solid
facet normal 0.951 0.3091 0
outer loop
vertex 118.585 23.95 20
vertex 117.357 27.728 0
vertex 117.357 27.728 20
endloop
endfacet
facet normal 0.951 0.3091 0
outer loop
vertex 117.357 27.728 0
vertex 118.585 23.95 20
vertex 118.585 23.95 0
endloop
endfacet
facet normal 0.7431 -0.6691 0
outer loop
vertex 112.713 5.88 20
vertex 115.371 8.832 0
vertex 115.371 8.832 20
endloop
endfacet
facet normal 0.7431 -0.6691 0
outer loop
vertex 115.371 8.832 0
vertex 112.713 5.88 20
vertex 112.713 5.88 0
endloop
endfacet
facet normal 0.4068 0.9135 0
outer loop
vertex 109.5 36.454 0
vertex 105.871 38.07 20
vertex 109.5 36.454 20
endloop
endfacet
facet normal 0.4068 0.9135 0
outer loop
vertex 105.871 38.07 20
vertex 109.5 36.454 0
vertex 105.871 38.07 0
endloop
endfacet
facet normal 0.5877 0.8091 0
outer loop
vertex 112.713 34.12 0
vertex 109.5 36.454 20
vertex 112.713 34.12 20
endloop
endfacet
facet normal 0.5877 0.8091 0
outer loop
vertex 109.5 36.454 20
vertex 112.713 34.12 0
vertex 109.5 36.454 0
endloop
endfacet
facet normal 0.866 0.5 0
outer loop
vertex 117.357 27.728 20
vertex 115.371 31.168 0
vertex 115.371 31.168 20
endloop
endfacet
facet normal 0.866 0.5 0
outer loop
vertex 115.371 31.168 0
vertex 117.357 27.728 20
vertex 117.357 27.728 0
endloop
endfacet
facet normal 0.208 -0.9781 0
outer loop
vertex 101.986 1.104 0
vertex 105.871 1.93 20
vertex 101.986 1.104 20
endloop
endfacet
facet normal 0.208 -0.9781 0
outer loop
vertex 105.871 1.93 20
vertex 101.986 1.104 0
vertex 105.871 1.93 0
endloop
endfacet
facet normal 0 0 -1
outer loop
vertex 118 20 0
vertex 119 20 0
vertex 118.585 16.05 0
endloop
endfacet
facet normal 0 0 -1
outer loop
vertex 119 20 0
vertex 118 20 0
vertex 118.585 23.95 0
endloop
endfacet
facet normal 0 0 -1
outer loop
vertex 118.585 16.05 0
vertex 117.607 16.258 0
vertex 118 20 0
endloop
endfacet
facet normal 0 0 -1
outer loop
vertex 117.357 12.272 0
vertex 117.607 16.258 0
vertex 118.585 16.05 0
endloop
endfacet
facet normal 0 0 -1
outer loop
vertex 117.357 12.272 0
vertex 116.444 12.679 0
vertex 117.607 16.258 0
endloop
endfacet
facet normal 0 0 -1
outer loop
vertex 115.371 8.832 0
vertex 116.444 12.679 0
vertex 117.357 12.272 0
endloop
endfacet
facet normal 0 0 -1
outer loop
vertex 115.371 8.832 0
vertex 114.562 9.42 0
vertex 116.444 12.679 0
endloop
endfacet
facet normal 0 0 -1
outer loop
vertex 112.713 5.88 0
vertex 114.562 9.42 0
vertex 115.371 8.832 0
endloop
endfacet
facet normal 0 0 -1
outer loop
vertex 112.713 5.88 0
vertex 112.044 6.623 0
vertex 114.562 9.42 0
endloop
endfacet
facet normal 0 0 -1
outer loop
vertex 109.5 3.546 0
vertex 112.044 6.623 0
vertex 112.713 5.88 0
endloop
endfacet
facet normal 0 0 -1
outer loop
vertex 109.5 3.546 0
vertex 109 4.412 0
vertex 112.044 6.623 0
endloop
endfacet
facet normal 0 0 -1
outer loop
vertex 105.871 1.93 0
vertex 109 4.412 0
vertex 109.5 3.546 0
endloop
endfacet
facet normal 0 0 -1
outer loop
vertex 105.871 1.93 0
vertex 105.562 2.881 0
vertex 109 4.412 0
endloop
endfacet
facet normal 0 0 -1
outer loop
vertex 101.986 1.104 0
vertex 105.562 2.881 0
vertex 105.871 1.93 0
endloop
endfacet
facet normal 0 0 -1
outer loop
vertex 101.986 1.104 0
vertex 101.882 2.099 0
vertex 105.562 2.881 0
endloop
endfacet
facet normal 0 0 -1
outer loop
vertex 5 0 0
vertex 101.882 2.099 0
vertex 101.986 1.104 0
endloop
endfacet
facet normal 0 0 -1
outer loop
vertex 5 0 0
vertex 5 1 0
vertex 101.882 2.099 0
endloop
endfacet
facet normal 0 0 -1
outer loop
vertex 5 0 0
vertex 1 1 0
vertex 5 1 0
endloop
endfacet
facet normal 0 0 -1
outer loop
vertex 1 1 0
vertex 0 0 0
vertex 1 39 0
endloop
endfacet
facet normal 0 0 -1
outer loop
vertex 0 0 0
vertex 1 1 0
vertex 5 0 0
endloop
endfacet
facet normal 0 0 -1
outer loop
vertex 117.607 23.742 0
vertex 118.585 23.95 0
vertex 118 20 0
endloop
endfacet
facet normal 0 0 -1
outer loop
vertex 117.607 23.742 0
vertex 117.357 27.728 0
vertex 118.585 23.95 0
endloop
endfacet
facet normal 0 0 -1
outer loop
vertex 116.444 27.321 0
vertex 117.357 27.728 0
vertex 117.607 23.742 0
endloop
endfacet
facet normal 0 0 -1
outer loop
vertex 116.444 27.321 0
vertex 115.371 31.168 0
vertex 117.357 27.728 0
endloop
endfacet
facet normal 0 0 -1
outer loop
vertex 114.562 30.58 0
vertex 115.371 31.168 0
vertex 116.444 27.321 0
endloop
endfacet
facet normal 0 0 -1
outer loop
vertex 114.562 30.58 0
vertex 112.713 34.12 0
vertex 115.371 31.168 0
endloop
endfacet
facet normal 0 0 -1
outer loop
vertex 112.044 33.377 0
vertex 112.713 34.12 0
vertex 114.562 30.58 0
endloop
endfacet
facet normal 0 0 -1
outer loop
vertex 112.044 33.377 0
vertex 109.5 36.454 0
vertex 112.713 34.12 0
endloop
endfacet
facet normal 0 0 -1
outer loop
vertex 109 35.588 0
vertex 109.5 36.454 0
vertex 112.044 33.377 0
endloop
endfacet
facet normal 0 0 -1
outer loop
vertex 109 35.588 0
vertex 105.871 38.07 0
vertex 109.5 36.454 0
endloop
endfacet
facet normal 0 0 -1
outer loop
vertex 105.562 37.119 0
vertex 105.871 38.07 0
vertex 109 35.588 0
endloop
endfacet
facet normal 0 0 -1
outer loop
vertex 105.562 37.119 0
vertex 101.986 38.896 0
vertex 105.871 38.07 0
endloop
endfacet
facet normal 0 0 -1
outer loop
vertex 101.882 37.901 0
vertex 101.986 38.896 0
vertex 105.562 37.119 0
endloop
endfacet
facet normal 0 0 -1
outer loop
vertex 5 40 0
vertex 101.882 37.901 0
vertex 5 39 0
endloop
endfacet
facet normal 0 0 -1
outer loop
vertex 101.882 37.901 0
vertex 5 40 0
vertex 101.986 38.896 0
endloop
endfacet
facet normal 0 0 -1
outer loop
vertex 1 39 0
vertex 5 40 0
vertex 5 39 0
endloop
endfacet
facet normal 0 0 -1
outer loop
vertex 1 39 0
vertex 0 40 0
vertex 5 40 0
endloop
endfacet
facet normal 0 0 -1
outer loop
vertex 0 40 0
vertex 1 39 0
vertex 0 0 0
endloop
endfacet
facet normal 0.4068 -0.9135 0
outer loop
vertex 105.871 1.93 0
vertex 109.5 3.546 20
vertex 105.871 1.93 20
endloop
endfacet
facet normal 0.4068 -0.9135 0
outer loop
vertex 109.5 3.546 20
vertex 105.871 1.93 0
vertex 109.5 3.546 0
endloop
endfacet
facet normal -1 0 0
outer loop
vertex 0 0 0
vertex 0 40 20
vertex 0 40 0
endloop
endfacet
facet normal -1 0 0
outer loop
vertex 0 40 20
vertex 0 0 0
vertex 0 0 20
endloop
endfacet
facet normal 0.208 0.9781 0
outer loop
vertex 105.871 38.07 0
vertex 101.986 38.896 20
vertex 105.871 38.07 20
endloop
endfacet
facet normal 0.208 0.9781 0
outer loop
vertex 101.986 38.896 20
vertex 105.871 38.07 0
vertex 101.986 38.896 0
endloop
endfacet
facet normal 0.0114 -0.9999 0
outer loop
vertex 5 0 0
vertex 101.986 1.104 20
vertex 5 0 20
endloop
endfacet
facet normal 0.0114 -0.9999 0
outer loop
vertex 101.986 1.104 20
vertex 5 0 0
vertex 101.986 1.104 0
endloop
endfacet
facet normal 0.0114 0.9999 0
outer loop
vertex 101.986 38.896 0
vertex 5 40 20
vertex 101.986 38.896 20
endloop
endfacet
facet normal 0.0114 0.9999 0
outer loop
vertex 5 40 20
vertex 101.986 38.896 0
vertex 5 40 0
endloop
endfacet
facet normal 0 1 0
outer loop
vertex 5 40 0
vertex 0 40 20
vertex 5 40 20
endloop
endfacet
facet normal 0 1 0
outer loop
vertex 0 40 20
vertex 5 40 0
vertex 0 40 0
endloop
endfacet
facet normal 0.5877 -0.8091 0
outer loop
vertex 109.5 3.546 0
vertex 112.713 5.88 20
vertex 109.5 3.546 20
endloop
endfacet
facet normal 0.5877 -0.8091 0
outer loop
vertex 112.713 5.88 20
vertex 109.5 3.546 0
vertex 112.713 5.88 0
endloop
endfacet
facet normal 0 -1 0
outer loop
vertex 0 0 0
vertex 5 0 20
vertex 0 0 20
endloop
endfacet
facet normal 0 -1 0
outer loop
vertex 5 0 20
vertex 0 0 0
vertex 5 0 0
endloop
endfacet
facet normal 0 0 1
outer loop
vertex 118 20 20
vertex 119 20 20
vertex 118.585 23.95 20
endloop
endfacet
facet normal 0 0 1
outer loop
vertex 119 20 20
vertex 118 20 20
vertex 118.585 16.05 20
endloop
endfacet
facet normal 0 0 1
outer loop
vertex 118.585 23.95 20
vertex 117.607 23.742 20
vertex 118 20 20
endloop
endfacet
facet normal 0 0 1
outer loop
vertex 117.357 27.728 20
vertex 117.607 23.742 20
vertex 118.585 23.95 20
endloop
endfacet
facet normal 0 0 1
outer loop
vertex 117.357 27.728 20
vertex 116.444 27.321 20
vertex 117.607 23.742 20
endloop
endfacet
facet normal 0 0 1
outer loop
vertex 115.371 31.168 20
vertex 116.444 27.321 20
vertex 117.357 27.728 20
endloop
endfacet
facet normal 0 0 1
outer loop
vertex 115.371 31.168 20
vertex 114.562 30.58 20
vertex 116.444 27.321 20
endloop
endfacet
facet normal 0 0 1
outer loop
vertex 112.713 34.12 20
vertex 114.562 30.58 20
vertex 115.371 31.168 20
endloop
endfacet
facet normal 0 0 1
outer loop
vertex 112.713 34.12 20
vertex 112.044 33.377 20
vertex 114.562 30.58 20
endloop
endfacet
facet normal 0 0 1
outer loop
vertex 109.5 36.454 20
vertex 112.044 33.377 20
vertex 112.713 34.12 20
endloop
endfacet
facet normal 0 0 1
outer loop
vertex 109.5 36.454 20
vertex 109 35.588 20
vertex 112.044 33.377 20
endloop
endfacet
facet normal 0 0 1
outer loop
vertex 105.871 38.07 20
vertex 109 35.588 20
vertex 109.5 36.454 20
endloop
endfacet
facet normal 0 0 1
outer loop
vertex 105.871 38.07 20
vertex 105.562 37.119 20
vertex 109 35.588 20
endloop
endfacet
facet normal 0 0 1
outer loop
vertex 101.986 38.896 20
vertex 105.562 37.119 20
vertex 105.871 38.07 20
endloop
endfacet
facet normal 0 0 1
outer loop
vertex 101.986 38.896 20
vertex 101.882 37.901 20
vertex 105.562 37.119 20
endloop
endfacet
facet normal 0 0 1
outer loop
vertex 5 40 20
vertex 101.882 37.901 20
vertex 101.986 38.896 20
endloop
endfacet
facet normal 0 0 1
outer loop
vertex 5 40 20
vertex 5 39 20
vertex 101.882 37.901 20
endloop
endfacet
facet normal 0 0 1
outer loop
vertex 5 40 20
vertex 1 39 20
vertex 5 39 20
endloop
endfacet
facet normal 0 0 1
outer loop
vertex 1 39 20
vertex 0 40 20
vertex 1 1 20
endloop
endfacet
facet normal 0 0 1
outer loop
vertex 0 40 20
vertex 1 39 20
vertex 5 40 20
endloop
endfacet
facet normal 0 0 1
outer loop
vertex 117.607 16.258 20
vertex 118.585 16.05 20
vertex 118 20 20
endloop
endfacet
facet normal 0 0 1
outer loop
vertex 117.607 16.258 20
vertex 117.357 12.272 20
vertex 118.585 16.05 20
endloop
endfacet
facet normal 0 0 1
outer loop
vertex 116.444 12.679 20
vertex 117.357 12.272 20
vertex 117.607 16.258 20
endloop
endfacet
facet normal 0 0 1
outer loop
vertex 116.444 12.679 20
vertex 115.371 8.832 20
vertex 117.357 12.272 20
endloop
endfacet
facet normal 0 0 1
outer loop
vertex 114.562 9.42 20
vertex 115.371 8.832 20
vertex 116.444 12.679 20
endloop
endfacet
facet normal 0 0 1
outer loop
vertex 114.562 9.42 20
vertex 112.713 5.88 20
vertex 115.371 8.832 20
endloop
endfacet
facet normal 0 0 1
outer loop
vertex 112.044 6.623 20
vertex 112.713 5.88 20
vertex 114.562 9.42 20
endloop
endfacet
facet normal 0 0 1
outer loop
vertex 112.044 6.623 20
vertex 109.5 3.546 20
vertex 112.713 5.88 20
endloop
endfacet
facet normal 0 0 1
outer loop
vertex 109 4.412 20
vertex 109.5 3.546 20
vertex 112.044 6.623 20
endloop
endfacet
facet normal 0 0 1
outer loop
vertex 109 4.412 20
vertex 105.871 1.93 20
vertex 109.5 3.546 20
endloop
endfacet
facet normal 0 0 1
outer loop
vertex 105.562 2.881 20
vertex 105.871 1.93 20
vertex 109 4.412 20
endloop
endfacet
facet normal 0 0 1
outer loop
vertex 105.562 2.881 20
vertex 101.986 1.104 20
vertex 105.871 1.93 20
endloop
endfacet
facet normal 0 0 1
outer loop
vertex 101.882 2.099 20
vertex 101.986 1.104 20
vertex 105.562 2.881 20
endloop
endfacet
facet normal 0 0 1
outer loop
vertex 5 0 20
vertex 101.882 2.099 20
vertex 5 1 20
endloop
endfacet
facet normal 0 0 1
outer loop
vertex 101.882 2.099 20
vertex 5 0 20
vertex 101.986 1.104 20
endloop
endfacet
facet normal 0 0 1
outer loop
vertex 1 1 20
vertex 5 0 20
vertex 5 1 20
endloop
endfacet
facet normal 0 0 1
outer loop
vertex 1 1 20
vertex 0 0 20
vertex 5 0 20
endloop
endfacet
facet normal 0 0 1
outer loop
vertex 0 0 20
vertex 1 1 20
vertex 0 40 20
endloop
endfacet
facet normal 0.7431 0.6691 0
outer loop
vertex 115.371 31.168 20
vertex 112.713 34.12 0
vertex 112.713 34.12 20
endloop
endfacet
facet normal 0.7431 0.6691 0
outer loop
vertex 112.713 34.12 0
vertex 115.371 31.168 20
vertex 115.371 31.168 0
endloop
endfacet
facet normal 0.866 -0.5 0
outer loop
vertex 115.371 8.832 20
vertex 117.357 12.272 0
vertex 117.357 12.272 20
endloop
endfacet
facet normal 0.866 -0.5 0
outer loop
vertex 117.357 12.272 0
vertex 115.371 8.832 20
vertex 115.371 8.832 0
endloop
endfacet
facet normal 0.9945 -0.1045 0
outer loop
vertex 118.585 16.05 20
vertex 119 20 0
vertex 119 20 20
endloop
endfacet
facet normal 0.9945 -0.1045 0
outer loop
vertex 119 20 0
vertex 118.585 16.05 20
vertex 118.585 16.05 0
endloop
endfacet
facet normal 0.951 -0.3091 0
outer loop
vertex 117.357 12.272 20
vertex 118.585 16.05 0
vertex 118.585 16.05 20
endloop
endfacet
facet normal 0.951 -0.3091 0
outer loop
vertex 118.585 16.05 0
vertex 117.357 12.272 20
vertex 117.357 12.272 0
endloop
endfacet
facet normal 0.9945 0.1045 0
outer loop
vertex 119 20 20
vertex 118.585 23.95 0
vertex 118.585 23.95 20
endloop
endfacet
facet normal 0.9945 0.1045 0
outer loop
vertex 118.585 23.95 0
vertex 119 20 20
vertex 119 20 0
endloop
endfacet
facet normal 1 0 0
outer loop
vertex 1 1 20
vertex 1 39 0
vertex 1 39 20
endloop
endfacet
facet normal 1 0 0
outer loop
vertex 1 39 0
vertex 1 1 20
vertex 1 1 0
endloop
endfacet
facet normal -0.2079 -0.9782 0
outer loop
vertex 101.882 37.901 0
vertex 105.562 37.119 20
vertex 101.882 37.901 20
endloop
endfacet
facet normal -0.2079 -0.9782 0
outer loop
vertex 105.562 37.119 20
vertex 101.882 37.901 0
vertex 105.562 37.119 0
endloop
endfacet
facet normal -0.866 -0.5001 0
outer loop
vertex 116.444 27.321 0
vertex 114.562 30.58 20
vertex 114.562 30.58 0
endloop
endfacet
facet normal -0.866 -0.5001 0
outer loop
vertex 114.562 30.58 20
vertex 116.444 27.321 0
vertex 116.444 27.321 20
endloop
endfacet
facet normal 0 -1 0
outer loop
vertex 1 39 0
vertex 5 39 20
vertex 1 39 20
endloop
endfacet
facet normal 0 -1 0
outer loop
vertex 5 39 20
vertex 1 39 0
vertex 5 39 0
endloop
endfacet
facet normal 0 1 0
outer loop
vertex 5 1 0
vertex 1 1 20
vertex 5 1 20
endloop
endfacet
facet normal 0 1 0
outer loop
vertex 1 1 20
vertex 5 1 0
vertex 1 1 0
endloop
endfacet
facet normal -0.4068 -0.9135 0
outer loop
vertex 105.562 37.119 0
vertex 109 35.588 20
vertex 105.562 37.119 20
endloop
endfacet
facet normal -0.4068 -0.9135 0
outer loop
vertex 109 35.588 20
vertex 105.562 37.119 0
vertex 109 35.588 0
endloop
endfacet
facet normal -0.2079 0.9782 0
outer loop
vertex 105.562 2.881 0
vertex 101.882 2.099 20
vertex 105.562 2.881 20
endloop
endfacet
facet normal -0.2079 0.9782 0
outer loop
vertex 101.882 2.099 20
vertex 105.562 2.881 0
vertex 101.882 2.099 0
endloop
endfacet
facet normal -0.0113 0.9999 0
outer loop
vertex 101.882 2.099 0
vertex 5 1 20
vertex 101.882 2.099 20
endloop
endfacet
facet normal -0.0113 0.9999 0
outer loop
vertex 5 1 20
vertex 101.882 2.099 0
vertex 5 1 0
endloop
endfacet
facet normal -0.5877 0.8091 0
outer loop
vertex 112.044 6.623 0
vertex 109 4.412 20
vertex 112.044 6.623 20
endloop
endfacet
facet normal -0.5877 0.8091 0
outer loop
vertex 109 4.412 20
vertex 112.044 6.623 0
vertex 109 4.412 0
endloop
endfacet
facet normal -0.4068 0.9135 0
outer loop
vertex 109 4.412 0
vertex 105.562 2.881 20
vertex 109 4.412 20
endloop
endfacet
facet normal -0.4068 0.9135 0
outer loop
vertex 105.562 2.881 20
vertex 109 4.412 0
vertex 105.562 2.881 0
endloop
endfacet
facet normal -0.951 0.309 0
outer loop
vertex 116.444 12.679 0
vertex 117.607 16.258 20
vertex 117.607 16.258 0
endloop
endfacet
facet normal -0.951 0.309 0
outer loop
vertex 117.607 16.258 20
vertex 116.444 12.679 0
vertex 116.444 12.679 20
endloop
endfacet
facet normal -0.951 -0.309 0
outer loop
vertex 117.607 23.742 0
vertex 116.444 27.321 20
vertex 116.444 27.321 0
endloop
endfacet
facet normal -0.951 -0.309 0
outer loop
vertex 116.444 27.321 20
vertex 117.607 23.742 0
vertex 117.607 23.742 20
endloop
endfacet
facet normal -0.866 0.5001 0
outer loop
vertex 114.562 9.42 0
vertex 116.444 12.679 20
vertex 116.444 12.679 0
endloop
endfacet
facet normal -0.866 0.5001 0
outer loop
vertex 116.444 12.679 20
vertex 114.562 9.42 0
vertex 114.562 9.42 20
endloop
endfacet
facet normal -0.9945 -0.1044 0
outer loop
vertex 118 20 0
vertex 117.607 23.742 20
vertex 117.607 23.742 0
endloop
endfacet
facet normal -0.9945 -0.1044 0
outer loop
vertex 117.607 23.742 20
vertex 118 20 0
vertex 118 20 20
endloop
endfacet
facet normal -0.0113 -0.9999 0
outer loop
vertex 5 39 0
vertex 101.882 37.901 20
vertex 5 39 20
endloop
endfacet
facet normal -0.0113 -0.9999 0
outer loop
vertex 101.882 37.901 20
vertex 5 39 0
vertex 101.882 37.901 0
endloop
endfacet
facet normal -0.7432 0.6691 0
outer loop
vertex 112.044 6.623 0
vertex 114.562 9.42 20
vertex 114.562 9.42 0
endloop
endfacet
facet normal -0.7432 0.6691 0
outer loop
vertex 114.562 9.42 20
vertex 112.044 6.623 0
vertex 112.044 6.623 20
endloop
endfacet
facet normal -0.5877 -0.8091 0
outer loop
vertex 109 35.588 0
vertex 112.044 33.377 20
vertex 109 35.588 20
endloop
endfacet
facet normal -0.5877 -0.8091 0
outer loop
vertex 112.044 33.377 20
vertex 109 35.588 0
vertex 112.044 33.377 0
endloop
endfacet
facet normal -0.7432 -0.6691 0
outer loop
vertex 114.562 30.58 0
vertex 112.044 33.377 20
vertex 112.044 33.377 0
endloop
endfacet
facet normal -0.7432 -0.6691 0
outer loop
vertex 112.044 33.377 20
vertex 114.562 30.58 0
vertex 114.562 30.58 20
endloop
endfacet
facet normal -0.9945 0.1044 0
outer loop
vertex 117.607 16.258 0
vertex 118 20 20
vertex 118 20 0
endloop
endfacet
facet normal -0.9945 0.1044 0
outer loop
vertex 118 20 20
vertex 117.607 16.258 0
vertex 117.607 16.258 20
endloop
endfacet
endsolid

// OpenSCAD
//The sides of this shape are almost axis-aligned, which may cause aliasing.

difference() {
	hull() {
		cube([5, 40, 20]);
		translate([100, 20, 0]) {
			cylinder(h=20, r=19);
		}
	}
	hull() {
		translate([1, 1, -1]) {
			cube([4, 38, 22]);
		}
		translate([100, 20, -1]) {
			cylinder(h=22, r=18);
		}
	}
}
